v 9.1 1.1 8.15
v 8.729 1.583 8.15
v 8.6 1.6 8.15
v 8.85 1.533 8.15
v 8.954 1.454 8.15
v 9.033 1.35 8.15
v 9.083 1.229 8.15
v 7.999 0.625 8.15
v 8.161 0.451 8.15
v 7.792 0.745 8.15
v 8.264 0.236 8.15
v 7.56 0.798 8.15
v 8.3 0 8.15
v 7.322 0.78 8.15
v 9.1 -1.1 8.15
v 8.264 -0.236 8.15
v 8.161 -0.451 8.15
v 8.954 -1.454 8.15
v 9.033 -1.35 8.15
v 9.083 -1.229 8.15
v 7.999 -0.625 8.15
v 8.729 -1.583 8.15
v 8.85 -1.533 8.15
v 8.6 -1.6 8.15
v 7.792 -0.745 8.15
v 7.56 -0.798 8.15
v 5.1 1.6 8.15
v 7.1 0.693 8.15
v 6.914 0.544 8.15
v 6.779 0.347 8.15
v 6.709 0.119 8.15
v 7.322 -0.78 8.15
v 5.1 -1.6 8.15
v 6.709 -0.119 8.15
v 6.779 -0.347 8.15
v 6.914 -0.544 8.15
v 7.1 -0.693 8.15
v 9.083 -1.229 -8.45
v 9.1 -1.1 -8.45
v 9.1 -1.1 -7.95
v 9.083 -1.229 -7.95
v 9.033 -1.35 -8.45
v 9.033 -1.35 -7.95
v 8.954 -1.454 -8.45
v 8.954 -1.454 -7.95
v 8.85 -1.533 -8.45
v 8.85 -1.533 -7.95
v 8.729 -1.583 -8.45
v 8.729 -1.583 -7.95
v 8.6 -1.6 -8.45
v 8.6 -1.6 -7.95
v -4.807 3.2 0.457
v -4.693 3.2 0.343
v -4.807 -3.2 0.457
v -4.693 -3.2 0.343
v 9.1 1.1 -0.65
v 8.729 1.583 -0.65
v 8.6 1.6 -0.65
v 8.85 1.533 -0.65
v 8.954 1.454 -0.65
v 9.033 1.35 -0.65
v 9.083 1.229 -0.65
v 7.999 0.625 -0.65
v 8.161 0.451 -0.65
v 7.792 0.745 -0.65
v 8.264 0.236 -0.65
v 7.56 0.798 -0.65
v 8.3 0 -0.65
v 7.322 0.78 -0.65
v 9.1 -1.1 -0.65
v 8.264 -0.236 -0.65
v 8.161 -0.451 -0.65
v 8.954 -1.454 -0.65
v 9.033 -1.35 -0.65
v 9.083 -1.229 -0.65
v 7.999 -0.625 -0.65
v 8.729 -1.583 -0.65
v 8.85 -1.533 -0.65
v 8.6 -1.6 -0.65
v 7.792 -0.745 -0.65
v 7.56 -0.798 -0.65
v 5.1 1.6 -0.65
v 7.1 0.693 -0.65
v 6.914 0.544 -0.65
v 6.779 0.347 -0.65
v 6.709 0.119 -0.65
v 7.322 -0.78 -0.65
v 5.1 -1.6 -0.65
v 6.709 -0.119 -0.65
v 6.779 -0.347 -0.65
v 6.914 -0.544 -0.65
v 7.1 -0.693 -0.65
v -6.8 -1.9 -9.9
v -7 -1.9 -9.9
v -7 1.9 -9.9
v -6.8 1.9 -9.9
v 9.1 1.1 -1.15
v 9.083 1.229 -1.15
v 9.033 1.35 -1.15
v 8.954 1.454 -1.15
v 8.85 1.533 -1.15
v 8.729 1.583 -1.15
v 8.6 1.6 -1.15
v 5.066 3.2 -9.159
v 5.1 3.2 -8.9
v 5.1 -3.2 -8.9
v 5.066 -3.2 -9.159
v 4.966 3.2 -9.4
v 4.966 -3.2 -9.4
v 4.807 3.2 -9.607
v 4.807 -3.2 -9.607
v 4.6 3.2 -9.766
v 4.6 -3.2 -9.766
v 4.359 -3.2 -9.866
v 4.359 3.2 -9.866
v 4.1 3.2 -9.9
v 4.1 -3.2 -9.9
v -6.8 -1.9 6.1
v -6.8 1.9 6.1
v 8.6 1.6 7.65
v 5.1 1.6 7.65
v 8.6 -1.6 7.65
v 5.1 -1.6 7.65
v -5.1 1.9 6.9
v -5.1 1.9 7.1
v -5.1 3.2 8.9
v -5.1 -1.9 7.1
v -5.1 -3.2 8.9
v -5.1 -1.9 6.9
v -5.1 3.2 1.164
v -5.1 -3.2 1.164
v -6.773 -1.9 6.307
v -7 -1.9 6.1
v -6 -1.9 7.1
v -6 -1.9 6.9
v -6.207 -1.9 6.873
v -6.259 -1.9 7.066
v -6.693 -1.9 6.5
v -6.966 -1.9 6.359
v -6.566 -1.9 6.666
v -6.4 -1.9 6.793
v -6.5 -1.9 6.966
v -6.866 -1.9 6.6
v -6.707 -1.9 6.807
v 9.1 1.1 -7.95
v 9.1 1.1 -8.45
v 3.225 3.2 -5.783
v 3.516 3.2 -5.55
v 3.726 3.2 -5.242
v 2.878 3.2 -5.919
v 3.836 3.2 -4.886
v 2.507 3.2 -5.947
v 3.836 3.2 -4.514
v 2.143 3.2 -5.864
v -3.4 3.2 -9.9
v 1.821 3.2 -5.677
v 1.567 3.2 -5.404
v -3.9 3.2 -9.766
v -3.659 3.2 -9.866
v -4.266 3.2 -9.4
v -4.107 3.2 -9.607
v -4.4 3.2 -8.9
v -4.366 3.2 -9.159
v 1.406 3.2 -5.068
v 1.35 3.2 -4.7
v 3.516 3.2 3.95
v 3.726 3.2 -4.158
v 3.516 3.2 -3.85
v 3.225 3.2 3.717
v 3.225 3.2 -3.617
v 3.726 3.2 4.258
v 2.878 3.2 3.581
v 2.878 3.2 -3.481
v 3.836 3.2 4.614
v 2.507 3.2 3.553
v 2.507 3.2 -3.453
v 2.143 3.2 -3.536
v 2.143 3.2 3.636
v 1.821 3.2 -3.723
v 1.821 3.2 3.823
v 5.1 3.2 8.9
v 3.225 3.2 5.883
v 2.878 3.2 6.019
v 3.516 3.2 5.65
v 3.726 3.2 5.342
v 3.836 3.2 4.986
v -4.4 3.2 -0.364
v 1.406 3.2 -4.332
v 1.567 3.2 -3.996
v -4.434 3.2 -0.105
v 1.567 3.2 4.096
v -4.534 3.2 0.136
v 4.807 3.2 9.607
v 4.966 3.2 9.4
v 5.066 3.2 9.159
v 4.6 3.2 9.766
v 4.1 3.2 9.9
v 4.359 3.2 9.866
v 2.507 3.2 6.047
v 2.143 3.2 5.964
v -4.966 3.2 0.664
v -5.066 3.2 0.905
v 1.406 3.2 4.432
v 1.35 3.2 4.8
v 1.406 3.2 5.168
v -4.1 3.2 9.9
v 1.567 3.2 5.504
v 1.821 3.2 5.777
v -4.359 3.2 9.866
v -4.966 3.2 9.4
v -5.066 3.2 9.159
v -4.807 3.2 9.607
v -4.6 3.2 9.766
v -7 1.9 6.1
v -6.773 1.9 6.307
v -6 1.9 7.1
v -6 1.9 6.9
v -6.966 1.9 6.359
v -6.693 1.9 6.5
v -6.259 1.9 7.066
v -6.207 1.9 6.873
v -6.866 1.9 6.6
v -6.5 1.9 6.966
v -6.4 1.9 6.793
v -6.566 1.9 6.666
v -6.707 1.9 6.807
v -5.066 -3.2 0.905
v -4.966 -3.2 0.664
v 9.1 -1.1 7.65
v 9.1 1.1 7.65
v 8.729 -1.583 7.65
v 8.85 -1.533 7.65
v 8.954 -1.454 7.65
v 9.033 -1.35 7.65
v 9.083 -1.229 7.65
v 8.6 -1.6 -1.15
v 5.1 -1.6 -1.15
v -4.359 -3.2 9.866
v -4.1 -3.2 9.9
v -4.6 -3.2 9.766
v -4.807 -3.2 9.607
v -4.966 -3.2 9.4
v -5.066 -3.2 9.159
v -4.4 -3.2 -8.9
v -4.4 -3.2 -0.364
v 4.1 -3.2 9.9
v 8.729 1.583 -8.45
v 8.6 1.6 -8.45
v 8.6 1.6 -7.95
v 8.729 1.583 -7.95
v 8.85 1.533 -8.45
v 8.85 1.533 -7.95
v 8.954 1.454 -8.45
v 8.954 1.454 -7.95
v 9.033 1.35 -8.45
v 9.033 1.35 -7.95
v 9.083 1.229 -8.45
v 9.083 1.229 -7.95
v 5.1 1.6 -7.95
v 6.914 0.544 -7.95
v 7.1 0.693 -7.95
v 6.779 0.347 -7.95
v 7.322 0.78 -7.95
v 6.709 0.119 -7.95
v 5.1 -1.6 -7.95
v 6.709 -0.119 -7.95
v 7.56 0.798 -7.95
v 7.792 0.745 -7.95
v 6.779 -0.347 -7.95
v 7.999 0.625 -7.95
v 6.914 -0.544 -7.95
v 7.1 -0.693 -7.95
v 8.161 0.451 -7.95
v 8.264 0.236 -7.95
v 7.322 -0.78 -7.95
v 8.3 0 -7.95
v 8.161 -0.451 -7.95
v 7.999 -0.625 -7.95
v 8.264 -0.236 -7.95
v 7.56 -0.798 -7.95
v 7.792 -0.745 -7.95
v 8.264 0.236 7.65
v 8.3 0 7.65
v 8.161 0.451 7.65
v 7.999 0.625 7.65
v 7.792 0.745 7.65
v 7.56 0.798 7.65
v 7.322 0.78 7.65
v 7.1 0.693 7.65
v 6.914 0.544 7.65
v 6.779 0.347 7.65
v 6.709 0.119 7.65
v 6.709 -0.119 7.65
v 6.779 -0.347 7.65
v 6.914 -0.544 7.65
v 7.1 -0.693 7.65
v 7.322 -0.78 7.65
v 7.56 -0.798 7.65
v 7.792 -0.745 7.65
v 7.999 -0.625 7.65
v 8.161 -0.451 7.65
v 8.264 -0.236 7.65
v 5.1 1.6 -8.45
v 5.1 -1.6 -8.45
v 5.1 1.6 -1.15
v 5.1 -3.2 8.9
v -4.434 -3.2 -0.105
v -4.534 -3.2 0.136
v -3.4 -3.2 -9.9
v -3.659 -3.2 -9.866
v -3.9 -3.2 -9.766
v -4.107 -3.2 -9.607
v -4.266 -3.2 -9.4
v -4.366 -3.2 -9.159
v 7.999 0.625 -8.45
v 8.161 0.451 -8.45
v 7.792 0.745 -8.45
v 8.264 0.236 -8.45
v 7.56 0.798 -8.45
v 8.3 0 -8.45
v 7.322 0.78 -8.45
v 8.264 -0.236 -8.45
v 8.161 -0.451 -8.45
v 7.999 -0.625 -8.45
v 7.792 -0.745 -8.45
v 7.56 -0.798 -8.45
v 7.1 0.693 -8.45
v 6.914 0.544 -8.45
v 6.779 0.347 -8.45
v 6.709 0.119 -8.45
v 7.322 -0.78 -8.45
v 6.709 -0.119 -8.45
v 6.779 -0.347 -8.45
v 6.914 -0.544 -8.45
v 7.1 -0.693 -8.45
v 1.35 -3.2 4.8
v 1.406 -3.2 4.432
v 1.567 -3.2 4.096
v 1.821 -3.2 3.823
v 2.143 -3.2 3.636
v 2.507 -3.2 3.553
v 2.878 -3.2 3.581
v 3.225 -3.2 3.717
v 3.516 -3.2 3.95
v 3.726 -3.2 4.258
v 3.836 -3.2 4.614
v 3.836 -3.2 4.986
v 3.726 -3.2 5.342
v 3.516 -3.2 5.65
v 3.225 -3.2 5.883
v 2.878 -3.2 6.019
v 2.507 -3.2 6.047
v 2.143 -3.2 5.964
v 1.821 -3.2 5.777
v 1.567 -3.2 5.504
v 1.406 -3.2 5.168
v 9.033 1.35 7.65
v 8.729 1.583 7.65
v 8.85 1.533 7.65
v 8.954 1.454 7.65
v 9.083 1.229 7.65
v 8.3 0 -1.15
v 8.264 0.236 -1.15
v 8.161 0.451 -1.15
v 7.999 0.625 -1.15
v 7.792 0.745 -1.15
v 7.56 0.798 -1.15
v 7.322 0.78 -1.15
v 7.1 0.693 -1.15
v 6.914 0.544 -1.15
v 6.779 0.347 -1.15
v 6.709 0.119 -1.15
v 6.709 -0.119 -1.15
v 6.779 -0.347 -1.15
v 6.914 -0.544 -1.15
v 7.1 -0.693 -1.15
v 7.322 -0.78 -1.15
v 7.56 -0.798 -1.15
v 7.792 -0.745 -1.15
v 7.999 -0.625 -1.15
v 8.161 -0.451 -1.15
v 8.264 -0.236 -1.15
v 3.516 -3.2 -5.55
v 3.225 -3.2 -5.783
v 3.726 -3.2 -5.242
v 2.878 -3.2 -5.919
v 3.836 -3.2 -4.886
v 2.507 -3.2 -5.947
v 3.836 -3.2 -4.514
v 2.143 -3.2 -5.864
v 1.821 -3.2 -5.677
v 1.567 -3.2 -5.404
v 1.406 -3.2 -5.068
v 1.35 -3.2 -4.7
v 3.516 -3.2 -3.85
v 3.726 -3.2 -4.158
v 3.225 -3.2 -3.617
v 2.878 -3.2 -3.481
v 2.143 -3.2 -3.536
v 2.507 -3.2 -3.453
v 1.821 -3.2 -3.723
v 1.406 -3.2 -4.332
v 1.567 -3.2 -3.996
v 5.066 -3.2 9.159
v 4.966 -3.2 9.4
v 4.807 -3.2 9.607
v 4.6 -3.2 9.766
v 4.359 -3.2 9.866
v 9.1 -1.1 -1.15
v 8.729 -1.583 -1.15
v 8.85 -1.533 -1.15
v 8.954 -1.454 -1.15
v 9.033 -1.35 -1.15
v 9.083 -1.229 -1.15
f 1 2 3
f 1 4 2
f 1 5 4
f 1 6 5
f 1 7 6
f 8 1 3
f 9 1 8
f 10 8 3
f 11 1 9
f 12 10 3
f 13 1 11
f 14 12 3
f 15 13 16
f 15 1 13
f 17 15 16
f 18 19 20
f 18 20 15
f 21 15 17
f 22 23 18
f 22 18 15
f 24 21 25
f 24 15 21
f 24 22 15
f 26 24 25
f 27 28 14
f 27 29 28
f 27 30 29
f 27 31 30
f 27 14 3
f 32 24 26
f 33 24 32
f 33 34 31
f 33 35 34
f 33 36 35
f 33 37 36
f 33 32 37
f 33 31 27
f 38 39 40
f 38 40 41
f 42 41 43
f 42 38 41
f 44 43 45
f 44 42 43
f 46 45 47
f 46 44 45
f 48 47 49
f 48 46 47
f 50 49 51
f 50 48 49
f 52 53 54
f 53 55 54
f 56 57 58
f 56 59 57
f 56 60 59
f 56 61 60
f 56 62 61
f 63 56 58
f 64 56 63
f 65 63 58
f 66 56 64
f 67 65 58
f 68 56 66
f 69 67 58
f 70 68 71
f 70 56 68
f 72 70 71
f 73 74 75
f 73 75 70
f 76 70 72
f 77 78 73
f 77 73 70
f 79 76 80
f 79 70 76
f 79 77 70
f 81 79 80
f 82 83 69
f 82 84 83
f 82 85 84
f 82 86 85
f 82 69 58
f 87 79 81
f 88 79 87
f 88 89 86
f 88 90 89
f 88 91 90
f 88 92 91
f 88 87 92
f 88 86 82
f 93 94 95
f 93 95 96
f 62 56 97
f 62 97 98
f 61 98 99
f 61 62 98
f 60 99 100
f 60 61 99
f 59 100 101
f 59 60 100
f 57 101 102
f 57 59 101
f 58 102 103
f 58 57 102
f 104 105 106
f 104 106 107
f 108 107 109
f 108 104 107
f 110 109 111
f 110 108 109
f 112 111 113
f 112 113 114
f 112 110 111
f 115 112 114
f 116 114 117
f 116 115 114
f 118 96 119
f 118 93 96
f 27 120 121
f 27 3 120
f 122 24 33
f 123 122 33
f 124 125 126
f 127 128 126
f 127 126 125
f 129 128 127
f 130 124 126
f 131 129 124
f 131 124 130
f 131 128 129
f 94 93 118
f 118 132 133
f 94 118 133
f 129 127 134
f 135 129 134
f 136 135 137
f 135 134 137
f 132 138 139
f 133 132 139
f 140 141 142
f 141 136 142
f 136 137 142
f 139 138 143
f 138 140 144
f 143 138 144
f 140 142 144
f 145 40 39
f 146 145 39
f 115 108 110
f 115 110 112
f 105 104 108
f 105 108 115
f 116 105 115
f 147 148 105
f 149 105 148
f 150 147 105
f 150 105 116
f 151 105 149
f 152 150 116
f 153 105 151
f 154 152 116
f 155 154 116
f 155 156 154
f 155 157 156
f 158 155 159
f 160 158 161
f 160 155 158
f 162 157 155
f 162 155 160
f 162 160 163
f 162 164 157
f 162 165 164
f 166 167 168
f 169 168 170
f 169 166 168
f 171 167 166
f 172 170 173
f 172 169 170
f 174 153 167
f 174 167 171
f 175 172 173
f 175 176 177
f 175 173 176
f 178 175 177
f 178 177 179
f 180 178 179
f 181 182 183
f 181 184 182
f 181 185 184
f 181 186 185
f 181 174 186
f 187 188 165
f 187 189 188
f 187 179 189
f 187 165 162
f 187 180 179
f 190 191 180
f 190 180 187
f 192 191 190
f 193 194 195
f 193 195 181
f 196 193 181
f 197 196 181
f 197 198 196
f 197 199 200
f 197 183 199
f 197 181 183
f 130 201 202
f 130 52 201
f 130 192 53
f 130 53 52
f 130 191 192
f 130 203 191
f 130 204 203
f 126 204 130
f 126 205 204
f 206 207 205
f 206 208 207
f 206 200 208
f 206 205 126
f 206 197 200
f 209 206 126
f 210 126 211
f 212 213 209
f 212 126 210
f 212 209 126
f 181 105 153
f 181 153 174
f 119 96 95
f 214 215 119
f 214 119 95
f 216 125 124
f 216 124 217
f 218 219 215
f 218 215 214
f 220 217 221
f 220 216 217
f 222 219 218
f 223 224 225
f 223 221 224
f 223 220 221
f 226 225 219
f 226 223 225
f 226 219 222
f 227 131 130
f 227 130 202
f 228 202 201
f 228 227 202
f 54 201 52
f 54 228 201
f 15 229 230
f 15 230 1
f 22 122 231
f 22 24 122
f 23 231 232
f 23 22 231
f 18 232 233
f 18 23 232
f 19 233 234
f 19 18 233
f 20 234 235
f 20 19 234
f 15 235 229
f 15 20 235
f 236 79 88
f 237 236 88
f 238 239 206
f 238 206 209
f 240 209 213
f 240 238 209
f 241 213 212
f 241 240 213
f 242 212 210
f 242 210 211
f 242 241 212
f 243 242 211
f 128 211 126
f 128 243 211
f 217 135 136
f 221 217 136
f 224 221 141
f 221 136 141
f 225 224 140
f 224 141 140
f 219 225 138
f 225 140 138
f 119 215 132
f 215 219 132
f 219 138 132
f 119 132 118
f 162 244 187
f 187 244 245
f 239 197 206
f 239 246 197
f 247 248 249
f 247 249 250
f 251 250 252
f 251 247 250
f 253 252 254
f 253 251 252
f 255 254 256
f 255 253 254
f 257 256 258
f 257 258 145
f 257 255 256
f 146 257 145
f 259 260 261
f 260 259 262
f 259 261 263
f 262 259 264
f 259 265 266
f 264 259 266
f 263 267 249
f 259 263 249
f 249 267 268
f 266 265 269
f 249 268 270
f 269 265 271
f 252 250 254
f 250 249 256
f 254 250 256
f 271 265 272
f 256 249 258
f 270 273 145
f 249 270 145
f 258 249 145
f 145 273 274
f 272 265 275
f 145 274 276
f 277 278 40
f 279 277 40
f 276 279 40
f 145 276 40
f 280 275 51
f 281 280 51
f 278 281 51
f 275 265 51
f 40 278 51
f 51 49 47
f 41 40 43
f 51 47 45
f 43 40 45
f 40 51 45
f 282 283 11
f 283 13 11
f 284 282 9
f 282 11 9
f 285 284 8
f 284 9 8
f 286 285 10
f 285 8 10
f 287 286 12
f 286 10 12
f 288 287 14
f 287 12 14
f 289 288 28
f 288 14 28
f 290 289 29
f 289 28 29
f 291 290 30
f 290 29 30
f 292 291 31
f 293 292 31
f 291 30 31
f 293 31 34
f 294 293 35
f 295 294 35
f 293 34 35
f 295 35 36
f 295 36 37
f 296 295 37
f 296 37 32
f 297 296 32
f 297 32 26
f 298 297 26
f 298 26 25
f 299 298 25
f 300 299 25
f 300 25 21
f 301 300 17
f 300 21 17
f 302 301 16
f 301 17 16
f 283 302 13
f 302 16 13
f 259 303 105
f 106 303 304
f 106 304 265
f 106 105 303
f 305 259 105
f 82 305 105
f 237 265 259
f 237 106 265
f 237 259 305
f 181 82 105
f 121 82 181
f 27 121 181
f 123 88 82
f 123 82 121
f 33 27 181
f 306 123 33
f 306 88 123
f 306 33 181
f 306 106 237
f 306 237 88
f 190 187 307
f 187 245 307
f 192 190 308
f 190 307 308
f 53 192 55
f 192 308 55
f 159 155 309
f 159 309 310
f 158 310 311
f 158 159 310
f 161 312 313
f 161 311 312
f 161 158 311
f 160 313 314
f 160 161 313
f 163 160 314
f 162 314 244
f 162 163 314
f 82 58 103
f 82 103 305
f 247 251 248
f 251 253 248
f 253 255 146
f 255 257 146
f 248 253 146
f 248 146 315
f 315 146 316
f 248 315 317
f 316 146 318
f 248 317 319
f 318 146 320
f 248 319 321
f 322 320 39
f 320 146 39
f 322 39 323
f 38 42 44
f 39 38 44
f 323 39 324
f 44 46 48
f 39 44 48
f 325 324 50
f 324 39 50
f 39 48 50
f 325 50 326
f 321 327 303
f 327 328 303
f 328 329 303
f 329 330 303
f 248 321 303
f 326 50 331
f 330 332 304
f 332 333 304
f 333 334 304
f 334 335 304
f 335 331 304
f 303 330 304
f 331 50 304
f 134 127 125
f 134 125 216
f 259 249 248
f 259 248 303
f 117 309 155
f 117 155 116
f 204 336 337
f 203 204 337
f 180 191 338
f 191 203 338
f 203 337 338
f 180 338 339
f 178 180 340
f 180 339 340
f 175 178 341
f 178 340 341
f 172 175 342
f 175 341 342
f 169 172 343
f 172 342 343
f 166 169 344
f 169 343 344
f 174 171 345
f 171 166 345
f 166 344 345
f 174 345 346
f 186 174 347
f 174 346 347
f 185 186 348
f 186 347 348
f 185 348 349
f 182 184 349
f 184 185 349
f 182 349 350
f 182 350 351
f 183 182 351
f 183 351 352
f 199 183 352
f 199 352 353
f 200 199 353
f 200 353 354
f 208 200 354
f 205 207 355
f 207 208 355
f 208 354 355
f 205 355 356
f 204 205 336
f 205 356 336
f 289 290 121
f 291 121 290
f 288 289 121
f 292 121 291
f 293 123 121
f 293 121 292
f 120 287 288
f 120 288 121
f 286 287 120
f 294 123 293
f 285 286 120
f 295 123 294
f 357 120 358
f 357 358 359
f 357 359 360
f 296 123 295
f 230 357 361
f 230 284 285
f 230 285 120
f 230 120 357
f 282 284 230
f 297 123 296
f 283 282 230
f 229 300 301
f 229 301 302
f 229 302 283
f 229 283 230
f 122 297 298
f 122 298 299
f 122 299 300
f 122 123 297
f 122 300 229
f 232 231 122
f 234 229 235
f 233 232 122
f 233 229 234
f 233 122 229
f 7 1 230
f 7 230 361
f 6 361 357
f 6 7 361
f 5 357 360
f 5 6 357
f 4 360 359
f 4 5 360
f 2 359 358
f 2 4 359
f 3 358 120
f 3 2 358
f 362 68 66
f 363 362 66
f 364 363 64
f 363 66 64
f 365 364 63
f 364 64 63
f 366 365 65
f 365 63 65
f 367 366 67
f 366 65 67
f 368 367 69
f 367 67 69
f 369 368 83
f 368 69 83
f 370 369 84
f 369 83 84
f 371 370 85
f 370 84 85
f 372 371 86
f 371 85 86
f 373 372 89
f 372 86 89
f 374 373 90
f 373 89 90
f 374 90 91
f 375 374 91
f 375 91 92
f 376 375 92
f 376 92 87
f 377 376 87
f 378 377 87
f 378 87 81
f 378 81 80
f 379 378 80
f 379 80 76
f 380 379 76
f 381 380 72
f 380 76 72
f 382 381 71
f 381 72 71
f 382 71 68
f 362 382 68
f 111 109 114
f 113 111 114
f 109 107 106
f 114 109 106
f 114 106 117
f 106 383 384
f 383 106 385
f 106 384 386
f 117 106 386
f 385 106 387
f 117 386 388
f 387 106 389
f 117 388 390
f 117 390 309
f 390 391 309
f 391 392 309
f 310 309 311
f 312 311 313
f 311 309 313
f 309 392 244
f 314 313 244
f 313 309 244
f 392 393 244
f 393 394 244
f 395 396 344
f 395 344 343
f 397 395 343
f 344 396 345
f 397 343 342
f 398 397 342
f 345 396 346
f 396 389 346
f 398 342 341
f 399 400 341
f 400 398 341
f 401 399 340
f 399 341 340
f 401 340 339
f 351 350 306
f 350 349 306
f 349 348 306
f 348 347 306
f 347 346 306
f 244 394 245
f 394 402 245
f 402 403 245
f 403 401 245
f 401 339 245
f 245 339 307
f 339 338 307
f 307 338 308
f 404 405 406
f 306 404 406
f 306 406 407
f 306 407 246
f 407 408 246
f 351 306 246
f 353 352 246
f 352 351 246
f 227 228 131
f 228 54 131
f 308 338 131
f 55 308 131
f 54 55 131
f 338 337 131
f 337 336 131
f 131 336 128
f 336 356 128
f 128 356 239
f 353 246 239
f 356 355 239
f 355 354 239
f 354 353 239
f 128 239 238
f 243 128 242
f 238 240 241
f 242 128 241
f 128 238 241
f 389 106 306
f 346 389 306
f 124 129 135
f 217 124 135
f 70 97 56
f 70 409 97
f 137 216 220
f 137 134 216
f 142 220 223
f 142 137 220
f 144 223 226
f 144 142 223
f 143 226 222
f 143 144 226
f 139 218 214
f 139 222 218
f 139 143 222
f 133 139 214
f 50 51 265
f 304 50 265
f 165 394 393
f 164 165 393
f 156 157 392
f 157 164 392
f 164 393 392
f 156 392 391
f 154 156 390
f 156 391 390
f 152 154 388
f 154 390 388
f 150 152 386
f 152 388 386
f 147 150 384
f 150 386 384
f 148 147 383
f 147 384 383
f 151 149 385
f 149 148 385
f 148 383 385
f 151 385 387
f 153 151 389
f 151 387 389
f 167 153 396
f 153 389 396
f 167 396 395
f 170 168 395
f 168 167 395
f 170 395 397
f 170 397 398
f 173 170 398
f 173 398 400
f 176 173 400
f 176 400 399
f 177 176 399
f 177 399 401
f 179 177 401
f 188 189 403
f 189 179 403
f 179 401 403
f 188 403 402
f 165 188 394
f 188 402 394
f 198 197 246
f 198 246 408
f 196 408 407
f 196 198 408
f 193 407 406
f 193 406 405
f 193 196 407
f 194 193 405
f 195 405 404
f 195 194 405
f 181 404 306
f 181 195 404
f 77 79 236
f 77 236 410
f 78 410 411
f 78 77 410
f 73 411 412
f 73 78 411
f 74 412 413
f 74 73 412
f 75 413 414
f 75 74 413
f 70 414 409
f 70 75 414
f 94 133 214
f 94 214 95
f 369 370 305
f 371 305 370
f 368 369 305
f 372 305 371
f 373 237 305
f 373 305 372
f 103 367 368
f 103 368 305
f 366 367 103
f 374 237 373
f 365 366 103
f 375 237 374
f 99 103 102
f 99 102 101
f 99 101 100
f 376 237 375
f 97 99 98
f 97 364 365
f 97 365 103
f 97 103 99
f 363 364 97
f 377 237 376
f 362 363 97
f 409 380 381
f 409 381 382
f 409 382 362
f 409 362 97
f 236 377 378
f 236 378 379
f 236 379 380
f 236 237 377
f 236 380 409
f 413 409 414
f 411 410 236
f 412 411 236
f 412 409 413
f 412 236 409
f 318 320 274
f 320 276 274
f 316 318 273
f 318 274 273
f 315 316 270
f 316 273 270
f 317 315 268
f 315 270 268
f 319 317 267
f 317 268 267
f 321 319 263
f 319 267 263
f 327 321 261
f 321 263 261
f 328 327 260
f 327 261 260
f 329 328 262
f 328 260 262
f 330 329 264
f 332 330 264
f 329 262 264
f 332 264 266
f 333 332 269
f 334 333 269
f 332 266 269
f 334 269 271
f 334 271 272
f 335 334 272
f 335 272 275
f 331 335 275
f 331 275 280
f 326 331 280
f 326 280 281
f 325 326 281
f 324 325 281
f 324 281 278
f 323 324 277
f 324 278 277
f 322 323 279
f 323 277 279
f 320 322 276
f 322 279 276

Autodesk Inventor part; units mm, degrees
ref_plane "YZ Plane" through (0, 0, 0) normal (1, 0, 0) x (0, 1, 0)
ref_plane "XZ Plane" through (0, 0, 0) normal (0, 1, 0) x (-1, 0, 0)
ref_plane "XY Plane" through (0, 0, 0) normal (0, 0, 1) x (1, 0, 0)
sketch "Sketch1" plane through (0, 0, 0) normal (0, 1, 0) x (-1, 0, 0)
  line L0 (-5.1, 9.9) -> (5.1, 9.9)
  line L1 (5.1, 9.9) -> (5.1, 0.75)
  line L2 (5.1, -9.9) -> (4.4, -9.9) construction
  line L3 (-5.1, -9.9) -> (-5.1, 9.9)
  line L4 (-5.1, 9.9) -> (5.1, -9.9) construction
  line L5 (5.1, 9.9) -> (-5.1, -9.9) construction
  line L6 (0, 9.9) -> (0, 4.8) construction
  line L7 (0, 9.9) -> (5.1, 9.9) construction
  line L8 (-5.1, 4.8) -> (-2.6, 4.8) construction
  circle A0 centre (-2.6, 4.8) radius 1.25
  line L9 (-2.6, 4.8) -> (-2.6, -4.7) construction
  line L10 (-2.6, 4.8) -> (6.9, 4.8) construction
  circle A1 centre (-2.6, -4.7) radius 1.25
  line L11 (-5.1, -9.9) -> (4.4, -9.9) construction
  line L12 (-5.1, -9.9) -> (4.4, -9.9) construction
  line L13 (4.4, -9.9) -> (4.4, 0.05)
  line L14 (4.4, 0.05) -> (5.1, 0.75)
  line L15 (5.1, 0.75) -> (5.1, -9.9) construction
  line L16 (4.4, -9.9) -> (-5.1, -9.9)
  point P0 (0, 0)
  dimension "d0" = 10.2
  dimension "d1" = 19.8
  dimension "d3" = 90
  dimension "d4" = 2.5
  dimension "d5" = 5.1
  dimension "d6" = 0
  dimension "d7" = 2.5
  dimension "d8" = 9.5
  dimension "d9" = 90
  dimension "d10" = 2.5
  dimension "d11" = 9.5
  dimension "d12" = 0
  dimension "d13" = 135
  dimension "d14" = 3.0759
extrude "Extrusion1" add sketch "Sketch1" along normal mid plane 6.4
sketch "Sketch2" plane through (0, 0, 0) normal (0, 1, 0) x (-1, 0, 0)
  line L0 (5.1, 9.9) -> (-5.1, 9.9) construction
  line L1 (-5.1, -9.9) -> (5.1, -9.9) construction
  line L2 (5.1, -9.9) -> (5.1, 9.9) construction
  line L3 (5.1, 9.9) -> (-5.1, 9.9) construction
  line L4 (-5.1, 9.9) -> (-5.1, -9.9) construction
  line L5 (-5.1, -9.9) -> (5.1, 9.9) construction
  line L6 (5.1, -9.9) -> (-5.1, 9.9) construction
  line L7 (5.1, 9.9) -> (5.1, 7.1) construction
  line L8 (5.1, 0.75) -> (5.1, 9.9) projected
  line L9 (5.1, 9.9) -> (7.9, 9.9) construction
  line L10 (5.1, 7.1) -> (7, 7.1) construction
  line L11 (5.1, 7.1) -> (7, 7.1) construction
  line L12 (7, 7.1) -> (7, -9.9) construction
  line L13 (6, 8.1) -> (8, 8.1) construction
  line L14 (8, 8.1) -> (8, 6.1) construction
  line L15 (8, 6.1) -> (6, 6.1) construction
  line L16 (6, 6.1) -> (6, 8.1) construction
  line L17 (6, 8.1) -> (8, 6.1) construction
  line L18 (8, 8.1) -> (6, 6.1) construction
  line L19 (5.1, 7.1) -> (6, 7.1)
  arc A0 (7, 6.1) -> (6, 7.1) centre (6, 6.1) ccw
  line L20 (7, 6.1) -> (7, -9.9)
  line L21 (7, -9.9) -> (6.8, -9.9)
  line L22 (6.8, -9.9) -> (6.8, 6.1)
  line L23 (5.1, 7.1) -> (5.1, 6.9)
  line L24 (5.1, 6.9) -> (6, 6.9)
  arc A1 (6.8, 6.1) -> (6, 6.9) centre (6, 6.1) ccw
  point P0 (0, 0)
  dimension "d17" = 2.8
  dimension "d18" = 90
  dimension "d19" = 1.9
  dimension "d20" = 0
  dimension "d21" = 2
  dimension "d22" = 2
  dimension "d23" = 0.2
  dimension "d24" = 90
  dimension "d25" = 0.2
extrude "Extrusion2" add sketch "Sketch2" along normal mid plane 3.8
sketch "Sketch3" plane through (0, 0, 0) normal (0, 1, 0) x (-1, 0, 0)
  line L0 (-5.1, 9.9) -> (-5.1, -9.9) construction
  line L1 (5.1, 9.9) -> (-5.1, 9.9) construction
  line L2 (-5.1, 9.9) -> (-5.1, -9.9) construction
  line L3 (-5.1, -9.9) -> (5.1, -9.9) construction
  line L4 (5.1, -9.9) -> (5.1, 9.9) construction
  line L5 (5.1, 9.9) -> (-5.1, -9.9) construction
  line L6 (-5.1, 9.9) -> (5.1, -9.9) construction
  line L7 (-5.1, 9.9) -> (-5.1, 7.9) construction
  line L8 (-5.1, 7.9) -> (-5.1, -0.9) construction
  line L9 (-5.1, -0.9) -> (-5.1, -8.2) construction
  line L10 (-9.1, 8.15) -> (-1.1, 8.15)
  line L11 (-1.1, 8.15) -> (-1.1, 7.65)
  line L12 (-1.1, 7.65) -> (-9.1, 7.65)
  line L13 (-9.1, 7.65) -> (-9.1, 8.15)
  line L14 (-9.1, 8.15) -> (-1.1, 7.65) construction
  line L15 (-1.1, 8.15) -> (-9.1, 7.65) construction
  line L16 (-9.1, -0.65) -> (-1.1, -0.65)
  line L17 (-1.1, -0.65) -> (-1.1, -1.15)
  line L18 (-1.1, -1.15) -> (-9.1, -1.15)
  line L19 (-9.1, -1.15) -> (-9.1, -0.65)
  line L20 (-9.1, -0.65) -> (-1.1, -1.15) construction
  line L21 (-1.1, -0.65) -> (-9.1, -1.15) construction
  line L22 (-9.1, -8.45) -> (-1.1, -8.45)
  line L23 (-1.1, -8.45) -> (-1.1, -7.95)
  line L24 (-1.1, -7.95) -> (-9.1, -7.95)
  line L25 (-9.1, -7.95) -> (-9.1, -8.45)
  line L26 (-9.1, -8.45) -> (-1.1, -7.95) construction
  line L27 (-1.1, -8.45) -> (-9.1, -7.95) construction
  point P0 (0, 0)
  dimension "d28" = 2
  dimension "d29" = 8.8
  dimension "d30" = 7.3
  dimension "d31" = 8
  dimension "d32" = 0.5
  dimension "d33" = 8
  dimension "d34" = 0.5
  dimension "d35" = 8
  dimension "d36" = 0.5
extrude "Extrusion3" add sketch "Sketch3" along normal mid plane 3.2
sketch "Sketch4" plane through (5.1, -1.6, 8.15) normal (0, 0, 1) x (1, 0, 0)
  line L0 (0, 3.2) -> (4, 3.2) construction
  line L1 (4, 0) -> (0, 0) construction
  line L2 (4, 3.2) -> (0.8, 3.2) construction
  line L3 (0.8, 3.2) -> (0.8, 0) construction
  line L4 (0.8, 0) -> (4, 0) construction
  line L5 (4, 0) -> (4, 3.2) construction
  line L6 (0.8, 3.2) -> (4, 0) construction
  line L7 (0.8, 0) -> (4, 3.2) construction
  circle A0 centre (2.4, 1.6) radius 0.8
  point P0 (-5.1, 1.6)
  dimension "d39" = 3.2
  dimension "d40" = 1.6
extrude "Extrusion4" cut sketch "Sketch4" against normal blind 40
fillet "Fillet1" radius 1 6 edges at (5.1, 0, 9.9) (-5.1, 0, 9.9) (-4.4, 0, -9.9) (5.1, 0, -9.9) (-4.4, 0, 0.05) (-5.1, 0, 0.75)
fillet "Fillet2" radius 0.5 6 edges at (9.1, 1.6, -8.2) (9.1, -1.6, -8.2) (9.1, -1.6, -0.9) (9.1, 1.6, -0.9) (9.1, -1.6, 7.9) (9.1, 1.6, 7.9)
properties part number "endstop_maszyna"
